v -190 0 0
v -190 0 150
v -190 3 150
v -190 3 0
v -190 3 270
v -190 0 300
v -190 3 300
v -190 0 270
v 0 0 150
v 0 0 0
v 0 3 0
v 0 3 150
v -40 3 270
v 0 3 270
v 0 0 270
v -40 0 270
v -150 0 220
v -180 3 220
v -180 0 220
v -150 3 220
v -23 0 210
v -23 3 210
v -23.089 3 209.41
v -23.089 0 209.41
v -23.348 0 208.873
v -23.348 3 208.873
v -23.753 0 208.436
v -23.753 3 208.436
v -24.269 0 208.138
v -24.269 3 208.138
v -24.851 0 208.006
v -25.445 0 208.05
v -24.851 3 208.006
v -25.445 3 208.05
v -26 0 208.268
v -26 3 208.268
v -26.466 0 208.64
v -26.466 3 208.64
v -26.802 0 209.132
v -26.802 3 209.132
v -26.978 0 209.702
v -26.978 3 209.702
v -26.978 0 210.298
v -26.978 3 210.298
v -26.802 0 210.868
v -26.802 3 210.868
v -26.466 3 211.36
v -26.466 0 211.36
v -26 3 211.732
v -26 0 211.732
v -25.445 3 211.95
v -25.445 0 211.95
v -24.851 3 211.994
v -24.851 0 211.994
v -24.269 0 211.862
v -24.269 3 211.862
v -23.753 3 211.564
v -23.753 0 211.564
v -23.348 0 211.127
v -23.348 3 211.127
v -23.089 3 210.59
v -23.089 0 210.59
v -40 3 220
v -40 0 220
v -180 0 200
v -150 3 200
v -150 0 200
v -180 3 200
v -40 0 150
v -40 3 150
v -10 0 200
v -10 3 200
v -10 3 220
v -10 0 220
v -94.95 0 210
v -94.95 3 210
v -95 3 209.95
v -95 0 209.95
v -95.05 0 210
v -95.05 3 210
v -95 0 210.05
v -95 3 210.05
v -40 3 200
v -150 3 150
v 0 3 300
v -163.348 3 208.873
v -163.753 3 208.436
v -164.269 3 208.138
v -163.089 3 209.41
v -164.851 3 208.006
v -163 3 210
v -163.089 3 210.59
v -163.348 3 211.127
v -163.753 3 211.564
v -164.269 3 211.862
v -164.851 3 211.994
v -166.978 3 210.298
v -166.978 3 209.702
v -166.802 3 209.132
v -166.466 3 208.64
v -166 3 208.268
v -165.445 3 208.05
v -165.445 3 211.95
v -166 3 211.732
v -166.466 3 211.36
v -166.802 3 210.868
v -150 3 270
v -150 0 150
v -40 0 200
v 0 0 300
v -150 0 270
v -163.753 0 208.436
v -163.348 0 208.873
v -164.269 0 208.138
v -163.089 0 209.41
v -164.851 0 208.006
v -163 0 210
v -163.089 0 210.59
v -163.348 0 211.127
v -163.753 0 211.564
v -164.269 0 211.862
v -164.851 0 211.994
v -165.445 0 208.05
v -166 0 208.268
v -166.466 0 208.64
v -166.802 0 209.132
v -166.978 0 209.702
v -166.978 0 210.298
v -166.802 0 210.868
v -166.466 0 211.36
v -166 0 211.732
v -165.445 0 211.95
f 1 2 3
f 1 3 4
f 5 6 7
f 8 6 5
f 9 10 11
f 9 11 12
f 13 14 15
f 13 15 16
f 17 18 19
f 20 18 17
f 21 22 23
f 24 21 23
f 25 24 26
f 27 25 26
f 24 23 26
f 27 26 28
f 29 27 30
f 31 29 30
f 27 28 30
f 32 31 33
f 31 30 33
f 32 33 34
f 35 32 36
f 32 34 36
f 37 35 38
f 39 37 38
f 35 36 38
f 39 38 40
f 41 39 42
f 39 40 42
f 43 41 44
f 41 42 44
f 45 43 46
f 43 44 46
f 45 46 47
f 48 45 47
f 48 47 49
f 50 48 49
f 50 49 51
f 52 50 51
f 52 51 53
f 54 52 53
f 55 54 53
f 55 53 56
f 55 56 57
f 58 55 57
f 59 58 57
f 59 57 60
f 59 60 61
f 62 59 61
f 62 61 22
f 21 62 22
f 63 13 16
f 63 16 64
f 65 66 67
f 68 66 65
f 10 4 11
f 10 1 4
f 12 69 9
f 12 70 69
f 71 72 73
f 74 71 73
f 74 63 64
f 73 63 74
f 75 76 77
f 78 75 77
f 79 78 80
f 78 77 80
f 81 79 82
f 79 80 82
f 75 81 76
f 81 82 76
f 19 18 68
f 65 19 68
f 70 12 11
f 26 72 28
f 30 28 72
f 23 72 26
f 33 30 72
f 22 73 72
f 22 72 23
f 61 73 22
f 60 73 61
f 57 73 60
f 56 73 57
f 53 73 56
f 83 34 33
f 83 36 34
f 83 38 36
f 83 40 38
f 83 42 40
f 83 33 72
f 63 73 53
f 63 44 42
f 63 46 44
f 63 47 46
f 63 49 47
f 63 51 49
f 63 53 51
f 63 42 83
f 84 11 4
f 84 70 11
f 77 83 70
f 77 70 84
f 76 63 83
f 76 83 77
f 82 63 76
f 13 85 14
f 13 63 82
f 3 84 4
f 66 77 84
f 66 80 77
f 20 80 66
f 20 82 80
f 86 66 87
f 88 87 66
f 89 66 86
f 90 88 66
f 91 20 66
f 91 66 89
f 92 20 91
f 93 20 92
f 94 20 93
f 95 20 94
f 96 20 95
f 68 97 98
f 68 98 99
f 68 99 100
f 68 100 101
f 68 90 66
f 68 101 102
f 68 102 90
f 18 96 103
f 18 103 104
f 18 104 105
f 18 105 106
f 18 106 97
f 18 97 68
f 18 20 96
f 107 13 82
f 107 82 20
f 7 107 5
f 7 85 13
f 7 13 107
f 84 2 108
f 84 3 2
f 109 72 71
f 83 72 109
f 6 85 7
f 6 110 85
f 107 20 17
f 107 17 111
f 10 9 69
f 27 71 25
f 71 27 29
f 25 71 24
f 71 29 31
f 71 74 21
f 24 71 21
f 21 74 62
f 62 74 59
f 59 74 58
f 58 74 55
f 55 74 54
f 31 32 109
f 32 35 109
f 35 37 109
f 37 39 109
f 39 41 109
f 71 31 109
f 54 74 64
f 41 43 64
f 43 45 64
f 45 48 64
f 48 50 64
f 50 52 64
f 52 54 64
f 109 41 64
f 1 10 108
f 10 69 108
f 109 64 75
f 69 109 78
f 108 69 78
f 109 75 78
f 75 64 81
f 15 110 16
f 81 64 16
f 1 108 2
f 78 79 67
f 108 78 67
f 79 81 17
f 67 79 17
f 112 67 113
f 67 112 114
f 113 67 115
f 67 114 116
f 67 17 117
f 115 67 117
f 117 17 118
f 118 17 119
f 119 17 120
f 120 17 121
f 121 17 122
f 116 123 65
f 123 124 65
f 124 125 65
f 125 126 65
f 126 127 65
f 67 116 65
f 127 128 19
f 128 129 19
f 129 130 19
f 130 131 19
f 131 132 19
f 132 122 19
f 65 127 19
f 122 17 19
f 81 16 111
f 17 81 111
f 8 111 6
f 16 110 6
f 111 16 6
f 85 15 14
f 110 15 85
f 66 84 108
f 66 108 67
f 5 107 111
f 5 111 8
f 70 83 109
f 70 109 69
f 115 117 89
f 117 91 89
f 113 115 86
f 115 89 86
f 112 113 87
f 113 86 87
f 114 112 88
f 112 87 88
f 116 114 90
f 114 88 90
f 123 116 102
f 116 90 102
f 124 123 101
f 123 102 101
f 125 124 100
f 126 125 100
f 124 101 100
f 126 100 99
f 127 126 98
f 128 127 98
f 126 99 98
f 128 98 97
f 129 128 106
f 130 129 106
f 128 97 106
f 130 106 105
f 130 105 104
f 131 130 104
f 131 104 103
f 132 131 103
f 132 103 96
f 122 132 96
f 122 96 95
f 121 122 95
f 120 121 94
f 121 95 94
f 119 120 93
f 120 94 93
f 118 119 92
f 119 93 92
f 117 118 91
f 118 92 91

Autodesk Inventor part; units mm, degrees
ref_plane "YZ Plane" through (0, 0, 0) normal (1, 0, 0) x (0, 1, 0)
ref_plane "XZ Plane" through (0, 0, 0) normal (0, 1, 0) x (-1, 0, 0)
ref_plane "XY Plane" through (0, 0, 0) normal (0, 0, 1) x (1, 0, 0)
sketch "Sketch1" plane through (0, 0, 0) normal (0, 1, 0) x (-1, 0, 0)
  line L0 (0, 0) -> (0, 300)
  line L1 (0, 300) -> (190, 300)
  line L2 (190, 300) -> (190, 0)
  line L3 (190, 0) -> (0, 0)
  line L4 (0, 300) -> (95, 300)
  line L5 (0, 300) -> (95, 300) construction
  line L6 (95, 300) -> (95, -51.2612)
  point P0 (95, 0)
  dimension "d0" = 300
  dimension "d1" = 190
  dimension "d2" = 90
  dimension "d3" = 300
  dimension "d4" = 90
  dimension "d23" = 95
  dimension "d24" = 0
  dimension "d25" = 90
extrude "Extrusion1" add sketch "Sketch1" along normal blind 3 contours L6 L1 L2 L3
sketch "Sketch2" plane through (0, 3, 0) normal (0, 1, 0) x (1, 0, 0)
  line L0 (-190, 0) -> (-190, -300) projected
  line L1 (-190, -300) -> (-190, -210)
  line L2 (-190, -210) -> (-190, -200)
  line L3 (-190, -200) -> (-190, -150)
  line L4 (-190, -210) -> (-190, -220)
  line L5 (-190, -150) -> (-150, -150)
  line L6 (-150, -150) -> (-150, -200)
  line L7 (-150, -200) -> (-190, -200)
  line L8 (-190, -200) -> (-190, -150)
  line L9 (-190, -220) -> (-150, -220)
  line L10 (-150, -220) -> (-150, -270)
  line L11 (-150, -270) -> (-190, -270)
  line L12 (-190, -270) -> (-190, -220)
  line L13 (-190, -220) -> (-180, -220)
  line L14 (-180, -220) -> (-180, -200)
  point P0 (0, 0)
  point P1 (-190, -270)
  dimension "d7" = 90
  dimension "d8" = 10
  dimension "d9" = 50
  dimension "d10" = 10
  dimension "d11" = 40
  dimension "d12" = 50
  dimension "d13" = 40
  dimension "d14" = 50
  dimension "d15" = 10
extrude "Extrusion2" cut sketch "Sketch2" against normal blind 3
mirror "Mirror1" about plane through (-95, 0, 300) normal (1, 0, 0) of "Extrusion2", "Extrusion1"
sketch "Sketch4" plane through (0, 3, 0) normal (0, 1, 0) x (1, 0, 0)
  line L0 (-40, -200) -> (-10, -200) projected
  line L1 (-10, -200) -> (-10, -210)
  line L2 (-10, -200) -> (0, -200) construction
  line L3 (-10, -210) -> (-25, -210)
  line L4 (-180, -200) -> (-180, -210)
  line L5 (-180, -200) -> (-180, -220) projected
  line L6 (-180, -200) -> (-170, -200) construction
  line L7 (-180, -210) -> (-165, -210)
  circle A0 centre (-165, -210) radius 2
  circle A1 centre (-25, -210) radius 2
  point P0 (0, 0)
  dimension "d26" = 10
  dimension "d27" = 90
  dimension "d28" = 15
  dimension "d29" = 90
  dimension "d30" = 10
  dimension "d31" = 90
  dimension "d32" = 15
  dimension "d33" = 90
  dimension "d34" = 4
  dimension "d35" = 4
extrude "Extrusion4" cut sketch "Sketch4" against normal blind 10
sketch "Sketch5" plane through (0, 3, 0) normal (0, 1, 0) x (1, 0, 0)
  circle A0 centre (-165, -210) radius 2 projected
  line L0 (-165, -210) -> (-95, -210)
  circle A1 centre (-95, -210) radius 0.05
  point P0 (0, 0)
  dimension "d38" = 70
  dimension "d39" = 0.1
extrude "Extrusion5" cut sketch "Sketch5" against normal blind 10 contours A1
properties part number "onderplaat v2"
